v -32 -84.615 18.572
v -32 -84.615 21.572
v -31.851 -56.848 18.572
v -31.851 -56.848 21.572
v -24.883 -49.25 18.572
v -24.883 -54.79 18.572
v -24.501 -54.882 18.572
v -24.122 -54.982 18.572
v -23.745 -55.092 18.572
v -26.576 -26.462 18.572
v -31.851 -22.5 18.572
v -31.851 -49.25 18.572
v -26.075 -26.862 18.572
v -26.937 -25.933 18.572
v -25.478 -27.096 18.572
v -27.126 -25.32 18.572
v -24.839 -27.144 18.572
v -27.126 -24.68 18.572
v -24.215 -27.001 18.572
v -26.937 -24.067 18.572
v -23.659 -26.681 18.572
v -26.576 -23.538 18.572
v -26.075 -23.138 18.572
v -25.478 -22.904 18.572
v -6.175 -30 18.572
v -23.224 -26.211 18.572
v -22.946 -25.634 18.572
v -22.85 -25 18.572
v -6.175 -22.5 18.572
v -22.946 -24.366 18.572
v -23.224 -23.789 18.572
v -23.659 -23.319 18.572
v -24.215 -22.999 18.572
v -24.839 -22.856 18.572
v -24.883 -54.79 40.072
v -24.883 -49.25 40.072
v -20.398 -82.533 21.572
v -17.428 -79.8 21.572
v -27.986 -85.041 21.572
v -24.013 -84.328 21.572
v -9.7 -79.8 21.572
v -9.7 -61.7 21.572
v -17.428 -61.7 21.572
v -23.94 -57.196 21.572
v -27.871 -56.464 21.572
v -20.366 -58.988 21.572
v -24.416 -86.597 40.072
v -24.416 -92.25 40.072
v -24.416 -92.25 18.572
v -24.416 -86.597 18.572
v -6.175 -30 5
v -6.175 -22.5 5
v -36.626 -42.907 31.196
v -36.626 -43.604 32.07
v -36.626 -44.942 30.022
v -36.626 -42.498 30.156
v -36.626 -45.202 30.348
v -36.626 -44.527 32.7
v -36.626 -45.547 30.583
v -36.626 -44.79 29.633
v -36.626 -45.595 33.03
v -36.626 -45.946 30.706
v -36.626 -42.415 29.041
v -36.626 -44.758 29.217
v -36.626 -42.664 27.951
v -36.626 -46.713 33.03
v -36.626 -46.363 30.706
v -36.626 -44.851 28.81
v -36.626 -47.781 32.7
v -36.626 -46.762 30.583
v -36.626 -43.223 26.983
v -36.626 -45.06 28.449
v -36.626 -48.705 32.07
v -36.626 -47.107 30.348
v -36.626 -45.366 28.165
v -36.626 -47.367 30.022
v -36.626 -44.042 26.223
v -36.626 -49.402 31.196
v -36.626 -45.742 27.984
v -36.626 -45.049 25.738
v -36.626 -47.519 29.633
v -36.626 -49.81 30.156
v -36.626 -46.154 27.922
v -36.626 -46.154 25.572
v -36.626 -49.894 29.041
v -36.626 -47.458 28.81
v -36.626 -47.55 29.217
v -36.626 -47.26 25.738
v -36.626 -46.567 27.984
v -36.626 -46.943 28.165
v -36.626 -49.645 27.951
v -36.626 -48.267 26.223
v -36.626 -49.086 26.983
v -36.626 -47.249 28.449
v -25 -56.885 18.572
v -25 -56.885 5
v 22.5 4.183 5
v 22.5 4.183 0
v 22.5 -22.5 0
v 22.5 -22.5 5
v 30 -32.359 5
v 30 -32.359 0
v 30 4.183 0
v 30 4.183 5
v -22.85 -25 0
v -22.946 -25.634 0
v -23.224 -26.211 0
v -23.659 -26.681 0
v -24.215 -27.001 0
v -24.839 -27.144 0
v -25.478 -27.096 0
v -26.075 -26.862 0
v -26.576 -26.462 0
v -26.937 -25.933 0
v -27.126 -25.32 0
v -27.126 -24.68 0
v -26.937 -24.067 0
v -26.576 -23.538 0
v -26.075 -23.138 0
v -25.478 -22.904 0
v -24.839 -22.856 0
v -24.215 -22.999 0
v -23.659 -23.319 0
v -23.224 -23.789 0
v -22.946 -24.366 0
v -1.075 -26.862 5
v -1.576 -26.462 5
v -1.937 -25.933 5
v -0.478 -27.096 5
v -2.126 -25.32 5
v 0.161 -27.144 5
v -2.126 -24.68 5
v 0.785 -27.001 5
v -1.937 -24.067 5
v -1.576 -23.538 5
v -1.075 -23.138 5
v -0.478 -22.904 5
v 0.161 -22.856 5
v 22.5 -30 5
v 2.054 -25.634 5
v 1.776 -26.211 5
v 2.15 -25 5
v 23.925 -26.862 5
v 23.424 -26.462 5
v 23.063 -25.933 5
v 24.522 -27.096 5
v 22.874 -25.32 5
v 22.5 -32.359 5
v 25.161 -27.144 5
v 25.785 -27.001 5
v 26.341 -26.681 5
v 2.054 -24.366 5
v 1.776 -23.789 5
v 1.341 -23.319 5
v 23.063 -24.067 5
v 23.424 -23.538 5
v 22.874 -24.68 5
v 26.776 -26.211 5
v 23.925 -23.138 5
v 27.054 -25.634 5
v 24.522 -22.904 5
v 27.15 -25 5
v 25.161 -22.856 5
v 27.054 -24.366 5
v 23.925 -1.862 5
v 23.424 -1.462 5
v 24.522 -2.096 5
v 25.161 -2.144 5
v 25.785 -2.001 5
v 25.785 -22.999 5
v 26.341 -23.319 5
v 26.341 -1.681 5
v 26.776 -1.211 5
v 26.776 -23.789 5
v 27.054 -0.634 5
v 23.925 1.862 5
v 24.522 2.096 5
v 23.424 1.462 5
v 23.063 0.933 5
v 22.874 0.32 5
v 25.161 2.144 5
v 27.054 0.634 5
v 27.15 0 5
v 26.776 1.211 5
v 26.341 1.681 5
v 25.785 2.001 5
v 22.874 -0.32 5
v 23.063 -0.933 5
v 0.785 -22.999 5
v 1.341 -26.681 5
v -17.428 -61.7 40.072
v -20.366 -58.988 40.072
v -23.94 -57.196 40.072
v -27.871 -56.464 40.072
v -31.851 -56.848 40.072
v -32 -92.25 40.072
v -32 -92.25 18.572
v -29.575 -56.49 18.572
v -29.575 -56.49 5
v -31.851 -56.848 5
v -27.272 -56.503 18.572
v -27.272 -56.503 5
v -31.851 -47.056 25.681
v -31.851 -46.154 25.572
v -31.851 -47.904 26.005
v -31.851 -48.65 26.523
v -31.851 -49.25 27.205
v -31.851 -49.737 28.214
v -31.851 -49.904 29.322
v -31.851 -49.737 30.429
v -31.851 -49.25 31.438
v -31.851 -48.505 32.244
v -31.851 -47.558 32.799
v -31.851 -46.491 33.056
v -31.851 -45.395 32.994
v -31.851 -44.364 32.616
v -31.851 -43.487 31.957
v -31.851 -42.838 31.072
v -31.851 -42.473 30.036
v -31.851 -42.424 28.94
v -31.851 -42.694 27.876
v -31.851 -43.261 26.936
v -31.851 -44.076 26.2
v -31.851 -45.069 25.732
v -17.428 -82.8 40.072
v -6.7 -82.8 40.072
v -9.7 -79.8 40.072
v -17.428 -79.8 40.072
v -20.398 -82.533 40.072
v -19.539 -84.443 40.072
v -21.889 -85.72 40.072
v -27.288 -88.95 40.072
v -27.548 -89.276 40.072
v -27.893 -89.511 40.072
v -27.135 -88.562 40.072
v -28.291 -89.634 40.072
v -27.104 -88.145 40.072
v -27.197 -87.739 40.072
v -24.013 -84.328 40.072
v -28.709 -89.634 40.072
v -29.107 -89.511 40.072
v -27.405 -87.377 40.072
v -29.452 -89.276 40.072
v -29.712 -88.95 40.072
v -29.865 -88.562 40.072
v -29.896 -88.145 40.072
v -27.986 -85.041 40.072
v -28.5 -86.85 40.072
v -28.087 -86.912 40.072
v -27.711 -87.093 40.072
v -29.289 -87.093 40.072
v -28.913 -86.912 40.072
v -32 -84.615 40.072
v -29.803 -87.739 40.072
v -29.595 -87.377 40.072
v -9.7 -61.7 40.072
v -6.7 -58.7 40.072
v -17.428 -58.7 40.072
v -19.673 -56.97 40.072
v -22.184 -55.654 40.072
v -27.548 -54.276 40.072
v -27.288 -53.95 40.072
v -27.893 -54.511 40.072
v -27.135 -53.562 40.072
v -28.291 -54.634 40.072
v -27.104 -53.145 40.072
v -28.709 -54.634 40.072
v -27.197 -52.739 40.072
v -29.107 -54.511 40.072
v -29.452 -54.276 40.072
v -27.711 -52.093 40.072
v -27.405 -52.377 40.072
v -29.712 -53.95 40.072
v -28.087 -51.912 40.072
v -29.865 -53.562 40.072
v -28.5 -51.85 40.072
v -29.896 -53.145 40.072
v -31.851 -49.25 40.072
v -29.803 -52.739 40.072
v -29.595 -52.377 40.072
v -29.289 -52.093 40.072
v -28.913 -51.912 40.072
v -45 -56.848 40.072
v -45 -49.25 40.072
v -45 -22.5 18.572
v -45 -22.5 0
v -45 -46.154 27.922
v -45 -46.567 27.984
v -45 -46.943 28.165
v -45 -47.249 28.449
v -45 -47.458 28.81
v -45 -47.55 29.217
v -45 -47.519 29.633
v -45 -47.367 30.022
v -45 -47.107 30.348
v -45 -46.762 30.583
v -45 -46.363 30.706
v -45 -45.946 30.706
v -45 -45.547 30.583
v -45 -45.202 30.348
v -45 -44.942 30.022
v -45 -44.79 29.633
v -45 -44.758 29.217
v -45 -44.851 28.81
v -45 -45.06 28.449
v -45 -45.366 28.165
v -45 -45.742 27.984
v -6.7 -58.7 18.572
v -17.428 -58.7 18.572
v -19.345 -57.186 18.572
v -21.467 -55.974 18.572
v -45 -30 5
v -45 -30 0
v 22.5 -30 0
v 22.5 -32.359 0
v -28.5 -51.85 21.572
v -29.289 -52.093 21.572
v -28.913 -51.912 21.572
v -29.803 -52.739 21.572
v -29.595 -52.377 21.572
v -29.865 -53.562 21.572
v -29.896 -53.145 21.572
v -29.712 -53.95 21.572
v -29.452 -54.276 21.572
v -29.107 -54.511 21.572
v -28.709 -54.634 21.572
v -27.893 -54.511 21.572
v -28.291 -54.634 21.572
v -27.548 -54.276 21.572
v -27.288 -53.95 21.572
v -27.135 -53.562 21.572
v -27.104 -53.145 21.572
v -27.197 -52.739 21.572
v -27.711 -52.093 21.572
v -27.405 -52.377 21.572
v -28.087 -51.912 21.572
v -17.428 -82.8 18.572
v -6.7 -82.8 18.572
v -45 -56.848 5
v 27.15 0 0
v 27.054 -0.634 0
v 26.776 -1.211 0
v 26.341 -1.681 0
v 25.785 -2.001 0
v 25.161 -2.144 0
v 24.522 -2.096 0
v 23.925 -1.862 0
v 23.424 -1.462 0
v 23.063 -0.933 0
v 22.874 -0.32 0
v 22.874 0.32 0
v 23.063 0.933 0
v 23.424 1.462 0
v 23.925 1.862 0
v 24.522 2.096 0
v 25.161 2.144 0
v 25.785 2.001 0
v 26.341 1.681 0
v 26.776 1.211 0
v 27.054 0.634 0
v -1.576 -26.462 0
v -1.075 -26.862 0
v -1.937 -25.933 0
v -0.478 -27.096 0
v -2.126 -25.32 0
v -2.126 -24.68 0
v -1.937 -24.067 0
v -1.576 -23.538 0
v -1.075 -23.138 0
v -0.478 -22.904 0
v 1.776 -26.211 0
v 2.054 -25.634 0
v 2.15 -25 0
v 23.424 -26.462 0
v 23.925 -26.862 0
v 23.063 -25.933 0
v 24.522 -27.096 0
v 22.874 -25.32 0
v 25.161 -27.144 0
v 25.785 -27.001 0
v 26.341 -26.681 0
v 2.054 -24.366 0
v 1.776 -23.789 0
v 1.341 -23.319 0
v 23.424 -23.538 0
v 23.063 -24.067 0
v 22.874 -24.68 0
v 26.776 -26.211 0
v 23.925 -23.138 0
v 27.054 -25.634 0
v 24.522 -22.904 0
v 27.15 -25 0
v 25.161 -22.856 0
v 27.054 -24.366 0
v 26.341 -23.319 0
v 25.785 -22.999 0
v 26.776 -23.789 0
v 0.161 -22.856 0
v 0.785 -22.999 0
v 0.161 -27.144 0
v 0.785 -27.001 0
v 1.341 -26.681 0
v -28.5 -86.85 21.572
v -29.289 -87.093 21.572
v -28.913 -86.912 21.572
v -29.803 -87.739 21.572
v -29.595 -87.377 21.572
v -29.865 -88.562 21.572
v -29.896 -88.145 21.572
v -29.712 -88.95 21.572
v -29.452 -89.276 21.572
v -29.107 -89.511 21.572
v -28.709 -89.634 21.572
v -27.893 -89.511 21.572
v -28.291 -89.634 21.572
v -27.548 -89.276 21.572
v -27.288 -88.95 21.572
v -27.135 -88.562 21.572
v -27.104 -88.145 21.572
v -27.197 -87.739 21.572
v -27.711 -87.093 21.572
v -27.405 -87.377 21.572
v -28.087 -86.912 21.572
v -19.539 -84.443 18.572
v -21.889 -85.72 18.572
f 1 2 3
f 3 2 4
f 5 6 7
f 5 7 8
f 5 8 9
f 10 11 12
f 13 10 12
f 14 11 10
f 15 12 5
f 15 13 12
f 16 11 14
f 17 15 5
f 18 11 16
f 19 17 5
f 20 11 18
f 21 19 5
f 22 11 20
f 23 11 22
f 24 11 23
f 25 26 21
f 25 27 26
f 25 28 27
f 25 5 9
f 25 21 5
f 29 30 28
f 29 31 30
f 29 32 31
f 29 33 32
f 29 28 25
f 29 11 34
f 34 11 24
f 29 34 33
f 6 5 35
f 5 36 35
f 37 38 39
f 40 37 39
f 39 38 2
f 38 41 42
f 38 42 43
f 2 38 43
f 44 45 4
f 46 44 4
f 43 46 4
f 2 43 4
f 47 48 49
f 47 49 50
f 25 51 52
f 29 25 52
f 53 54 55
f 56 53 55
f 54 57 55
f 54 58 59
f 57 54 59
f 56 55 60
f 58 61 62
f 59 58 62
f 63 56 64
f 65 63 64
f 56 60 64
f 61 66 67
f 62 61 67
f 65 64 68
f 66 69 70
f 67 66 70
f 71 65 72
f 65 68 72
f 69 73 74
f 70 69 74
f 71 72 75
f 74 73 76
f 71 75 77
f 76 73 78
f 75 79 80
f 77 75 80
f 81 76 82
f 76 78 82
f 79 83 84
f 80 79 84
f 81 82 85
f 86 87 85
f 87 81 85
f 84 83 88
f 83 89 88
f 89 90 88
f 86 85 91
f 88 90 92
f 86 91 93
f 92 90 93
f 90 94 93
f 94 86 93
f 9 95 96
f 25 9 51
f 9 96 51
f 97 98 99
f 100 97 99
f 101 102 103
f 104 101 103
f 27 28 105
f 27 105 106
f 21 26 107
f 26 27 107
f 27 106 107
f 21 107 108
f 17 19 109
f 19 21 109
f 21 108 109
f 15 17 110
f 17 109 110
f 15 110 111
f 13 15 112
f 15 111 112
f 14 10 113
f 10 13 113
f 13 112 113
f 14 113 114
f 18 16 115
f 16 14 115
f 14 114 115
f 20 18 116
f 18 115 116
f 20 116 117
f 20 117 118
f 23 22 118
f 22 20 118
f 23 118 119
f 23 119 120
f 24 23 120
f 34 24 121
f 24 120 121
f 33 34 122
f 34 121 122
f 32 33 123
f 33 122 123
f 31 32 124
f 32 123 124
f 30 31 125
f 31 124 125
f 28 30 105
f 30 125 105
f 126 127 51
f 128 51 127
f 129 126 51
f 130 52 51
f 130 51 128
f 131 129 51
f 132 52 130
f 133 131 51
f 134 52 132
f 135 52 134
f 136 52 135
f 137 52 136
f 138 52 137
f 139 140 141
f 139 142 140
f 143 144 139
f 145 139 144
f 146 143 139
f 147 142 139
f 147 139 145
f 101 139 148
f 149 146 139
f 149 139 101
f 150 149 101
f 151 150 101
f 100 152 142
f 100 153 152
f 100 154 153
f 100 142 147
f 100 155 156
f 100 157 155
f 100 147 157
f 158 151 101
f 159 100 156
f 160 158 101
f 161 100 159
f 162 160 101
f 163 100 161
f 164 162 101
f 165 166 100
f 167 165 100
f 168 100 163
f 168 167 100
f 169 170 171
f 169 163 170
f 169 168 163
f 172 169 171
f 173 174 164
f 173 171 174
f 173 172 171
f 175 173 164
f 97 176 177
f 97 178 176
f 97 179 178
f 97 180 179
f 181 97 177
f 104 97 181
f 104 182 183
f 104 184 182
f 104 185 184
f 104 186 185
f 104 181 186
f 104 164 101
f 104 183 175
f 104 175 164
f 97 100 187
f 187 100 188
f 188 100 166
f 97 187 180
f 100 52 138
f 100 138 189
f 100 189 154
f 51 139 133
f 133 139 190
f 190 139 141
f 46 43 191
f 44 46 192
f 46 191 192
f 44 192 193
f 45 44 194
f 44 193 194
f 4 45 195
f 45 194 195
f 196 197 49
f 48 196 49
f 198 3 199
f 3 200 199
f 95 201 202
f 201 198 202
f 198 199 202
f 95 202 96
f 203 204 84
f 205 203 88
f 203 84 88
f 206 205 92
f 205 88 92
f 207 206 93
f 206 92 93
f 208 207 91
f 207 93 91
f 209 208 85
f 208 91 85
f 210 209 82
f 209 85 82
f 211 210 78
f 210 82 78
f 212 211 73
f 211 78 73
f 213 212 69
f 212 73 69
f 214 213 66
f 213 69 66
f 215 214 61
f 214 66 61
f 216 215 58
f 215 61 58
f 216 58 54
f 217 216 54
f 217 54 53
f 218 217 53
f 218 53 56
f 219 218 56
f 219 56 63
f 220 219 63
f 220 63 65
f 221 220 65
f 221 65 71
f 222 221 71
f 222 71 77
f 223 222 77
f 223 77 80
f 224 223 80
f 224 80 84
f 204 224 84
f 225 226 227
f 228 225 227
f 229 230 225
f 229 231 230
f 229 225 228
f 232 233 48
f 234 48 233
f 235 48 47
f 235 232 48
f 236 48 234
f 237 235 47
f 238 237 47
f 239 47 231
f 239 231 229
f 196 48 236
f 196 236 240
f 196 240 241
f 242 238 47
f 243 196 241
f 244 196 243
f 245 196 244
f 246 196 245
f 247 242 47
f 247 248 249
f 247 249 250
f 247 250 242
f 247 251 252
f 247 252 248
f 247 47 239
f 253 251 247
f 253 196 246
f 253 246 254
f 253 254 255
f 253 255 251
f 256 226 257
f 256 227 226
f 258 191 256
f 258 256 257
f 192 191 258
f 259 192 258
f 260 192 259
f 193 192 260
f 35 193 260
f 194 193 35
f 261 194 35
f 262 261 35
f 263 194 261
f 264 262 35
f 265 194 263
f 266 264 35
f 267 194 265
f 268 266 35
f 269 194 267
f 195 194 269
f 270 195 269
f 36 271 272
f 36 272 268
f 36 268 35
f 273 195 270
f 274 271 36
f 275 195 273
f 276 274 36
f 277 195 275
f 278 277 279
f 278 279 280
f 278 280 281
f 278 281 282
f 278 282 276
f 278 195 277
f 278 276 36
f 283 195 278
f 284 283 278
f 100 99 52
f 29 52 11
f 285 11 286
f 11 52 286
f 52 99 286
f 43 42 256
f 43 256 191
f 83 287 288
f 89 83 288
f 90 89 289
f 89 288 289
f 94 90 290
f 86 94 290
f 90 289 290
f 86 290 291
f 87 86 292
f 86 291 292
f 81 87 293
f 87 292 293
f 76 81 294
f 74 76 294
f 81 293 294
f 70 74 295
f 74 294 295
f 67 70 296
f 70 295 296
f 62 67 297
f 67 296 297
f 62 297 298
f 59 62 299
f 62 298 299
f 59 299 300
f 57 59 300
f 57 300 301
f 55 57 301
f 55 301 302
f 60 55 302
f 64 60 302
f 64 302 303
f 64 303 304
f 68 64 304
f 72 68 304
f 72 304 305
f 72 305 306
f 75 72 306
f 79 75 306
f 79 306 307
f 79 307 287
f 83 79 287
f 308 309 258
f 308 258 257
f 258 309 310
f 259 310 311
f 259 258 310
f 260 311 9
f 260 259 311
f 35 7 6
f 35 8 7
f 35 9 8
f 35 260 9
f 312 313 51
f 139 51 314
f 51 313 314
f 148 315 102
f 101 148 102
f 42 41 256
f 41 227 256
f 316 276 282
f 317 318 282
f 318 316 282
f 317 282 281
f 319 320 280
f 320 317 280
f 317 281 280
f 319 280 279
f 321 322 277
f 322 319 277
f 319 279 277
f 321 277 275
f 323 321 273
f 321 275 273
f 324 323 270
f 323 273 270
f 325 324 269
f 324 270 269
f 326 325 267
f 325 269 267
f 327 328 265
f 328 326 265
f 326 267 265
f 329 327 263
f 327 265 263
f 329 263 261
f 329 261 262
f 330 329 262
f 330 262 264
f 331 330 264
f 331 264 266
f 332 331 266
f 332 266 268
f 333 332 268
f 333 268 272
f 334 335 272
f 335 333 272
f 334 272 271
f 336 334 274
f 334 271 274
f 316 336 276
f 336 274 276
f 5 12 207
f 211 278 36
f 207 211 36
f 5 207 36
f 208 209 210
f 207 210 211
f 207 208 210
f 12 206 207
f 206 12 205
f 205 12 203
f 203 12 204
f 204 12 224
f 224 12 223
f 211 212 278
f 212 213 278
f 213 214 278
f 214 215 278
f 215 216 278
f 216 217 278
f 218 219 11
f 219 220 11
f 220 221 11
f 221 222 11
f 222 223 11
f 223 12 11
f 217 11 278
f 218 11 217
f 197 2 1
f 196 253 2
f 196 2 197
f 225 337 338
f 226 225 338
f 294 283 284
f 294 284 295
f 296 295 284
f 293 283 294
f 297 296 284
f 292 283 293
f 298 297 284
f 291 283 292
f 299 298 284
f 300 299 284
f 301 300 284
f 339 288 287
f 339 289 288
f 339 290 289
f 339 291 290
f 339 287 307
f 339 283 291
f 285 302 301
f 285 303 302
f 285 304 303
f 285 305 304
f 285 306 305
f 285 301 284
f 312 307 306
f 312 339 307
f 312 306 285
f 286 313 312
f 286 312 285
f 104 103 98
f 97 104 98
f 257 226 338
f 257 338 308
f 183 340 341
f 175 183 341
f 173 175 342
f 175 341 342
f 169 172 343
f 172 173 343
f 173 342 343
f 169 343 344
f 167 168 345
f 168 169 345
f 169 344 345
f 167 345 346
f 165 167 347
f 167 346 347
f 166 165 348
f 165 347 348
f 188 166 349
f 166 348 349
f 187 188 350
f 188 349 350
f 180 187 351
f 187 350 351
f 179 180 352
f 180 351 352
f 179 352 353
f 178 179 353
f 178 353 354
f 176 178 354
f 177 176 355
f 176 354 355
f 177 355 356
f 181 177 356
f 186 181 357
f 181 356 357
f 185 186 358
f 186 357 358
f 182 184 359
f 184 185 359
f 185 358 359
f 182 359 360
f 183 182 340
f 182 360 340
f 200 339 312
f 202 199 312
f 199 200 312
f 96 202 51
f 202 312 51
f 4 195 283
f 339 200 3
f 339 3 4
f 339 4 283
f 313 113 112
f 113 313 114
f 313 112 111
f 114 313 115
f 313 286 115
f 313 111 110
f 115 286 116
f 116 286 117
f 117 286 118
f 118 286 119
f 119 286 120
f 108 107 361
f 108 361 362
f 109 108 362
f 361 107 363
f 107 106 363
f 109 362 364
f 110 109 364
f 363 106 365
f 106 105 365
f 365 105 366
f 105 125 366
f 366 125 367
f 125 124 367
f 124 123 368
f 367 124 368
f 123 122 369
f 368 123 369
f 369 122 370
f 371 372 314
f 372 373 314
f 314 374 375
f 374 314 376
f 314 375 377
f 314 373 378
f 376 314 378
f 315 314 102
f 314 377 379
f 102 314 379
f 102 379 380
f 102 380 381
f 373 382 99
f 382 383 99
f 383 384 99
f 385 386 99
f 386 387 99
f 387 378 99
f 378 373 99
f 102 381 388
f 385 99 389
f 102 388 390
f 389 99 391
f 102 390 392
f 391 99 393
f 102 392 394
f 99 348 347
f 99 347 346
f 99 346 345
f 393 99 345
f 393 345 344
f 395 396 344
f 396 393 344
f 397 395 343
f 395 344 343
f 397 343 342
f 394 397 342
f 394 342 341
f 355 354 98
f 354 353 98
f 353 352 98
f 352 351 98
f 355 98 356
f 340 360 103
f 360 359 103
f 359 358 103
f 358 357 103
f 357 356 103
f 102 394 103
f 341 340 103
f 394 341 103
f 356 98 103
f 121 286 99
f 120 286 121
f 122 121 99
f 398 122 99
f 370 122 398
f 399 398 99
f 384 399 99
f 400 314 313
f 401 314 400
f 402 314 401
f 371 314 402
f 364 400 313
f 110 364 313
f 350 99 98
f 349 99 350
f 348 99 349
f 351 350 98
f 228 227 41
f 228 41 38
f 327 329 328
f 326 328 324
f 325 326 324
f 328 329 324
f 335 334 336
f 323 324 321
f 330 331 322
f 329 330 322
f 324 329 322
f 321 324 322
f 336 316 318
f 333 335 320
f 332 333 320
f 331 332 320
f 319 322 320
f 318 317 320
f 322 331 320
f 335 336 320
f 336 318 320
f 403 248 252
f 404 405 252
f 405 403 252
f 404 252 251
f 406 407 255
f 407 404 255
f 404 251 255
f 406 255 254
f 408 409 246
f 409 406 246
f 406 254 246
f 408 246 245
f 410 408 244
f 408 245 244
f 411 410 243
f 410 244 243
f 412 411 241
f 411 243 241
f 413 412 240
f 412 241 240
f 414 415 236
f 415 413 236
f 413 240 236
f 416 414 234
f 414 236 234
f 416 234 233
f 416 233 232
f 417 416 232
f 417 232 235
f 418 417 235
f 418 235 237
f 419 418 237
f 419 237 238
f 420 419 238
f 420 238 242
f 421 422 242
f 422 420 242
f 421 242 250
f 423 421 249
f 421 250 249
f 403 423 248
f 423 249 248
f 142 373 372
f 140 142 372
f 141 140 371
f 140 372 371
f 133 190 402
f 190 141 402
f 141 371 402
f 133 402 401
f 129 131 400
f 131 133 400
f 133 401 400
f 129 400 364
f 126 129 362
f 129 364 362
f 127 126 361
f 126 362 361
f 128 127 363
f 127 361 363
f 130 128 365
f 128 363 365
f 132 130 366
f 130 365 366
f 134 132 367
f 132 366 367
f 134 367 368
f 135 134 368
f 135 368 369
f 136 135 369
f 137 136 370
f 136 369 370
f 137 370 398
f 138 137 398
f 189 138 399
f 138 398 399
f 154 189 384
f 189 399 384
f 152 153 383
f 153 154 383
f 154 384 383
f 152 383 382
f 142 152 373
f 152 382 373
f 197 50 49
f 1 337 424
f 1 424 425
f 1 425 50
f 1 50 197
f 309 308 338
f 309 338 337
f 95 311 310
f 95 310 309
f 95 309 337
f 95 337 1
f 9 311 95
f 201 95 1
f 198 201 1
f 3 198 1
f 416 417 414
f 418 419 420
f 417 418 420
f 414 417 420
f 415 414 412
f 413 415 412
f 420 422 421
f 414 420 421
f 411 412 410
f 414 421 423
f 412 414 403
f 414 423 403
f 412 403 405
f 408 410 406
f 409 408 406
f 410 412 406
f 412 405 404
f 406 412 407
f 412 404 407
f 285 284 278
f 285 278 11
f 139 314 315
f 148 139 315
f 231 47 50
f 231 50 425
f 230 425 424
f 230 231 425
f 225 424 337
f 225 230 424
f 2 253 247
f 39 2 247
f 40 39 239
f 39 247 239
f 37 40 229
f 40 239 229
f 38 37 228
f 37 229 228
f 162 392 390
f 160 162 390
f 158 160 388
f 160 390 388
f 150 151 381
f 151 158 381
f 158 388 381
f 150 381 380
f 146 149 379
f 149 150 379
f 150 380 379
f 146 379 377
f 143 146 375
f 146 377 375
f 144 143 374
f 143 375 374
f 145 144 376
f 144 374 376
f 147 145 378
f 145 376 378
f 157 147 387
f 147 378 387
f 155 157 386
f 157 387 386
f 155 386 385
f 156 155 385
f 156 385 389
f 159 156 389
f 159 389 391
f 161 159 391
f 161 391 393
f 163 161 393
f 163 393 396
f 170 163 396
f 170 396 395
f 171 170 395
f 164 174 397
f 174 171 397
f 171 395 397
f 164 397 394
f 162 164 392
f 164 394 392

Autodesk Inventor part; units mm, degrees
ref_plane "YZ Plane" through (0, 0, 0) normal (1, 0, 0) x (0, 1, 0)
ref_plane "XZ Plane" through (0, 0, 0) normal (0, 1, 0) x (-1, 0, 0)
ref_plane "Work Plane1" through (0, 0, 0) normal (0, 0, 1) x (1, 0, 0)
sketch "Sketch1" plane through (0, 0, 0) normal (0, 0, 1) x (1, 0, 0)
  line L0 (-45, 22) -> (22, 22) projected
  line L1 (22, 22) -> (22, -22) projected
  line L2 (22, -22) -> (-45, -22) projected
  line L3 (-45, -28) -> (-45, -22) projected
  line L4 (-30, -28) -> (-45, -28) projected
  line L5 (-30, -28) -> (-28, -30) projected
  line L6 (-28, -30) -> (28, -30) projected
  line L7 (28, -30) -> (30, -28) projected
  line L8 (30, -28) -> (30, 28) projected
  line L9 (30, 28) -> (28, 30) projected
  line L10 (28, 30) -> (-28, 30) projected
  line L11 (-28, 30) -> (-30, 28) projected
  line L12 (-30, 28) -> (-45, 28) projected
  line L13 (-45, 22) -> (-45, 28) projected
  circle A0 centre (25, 25) radius 1.95 projected
  circle A1 centre (25, 0) radius 1.95 projected
  circle A2 centre (0, 25) radius 1.95 projected
  circle A3 centre (-25, -25) radius 1.95 projected
  circle A4 centre (25, -25) radius 1.95 projected
  circle A5 centre (-25, 25) radius 1.95 projected
  circle A6 centre (0, -25) radius 1.95 projected
  line L14 (30, 4.1832) -> (22.5, 4.1832)
  line L15 (22.5, 4.1832) -> (22.5, -32.3594)
  line L16 (22.5, -32.3594) -> (30, -32.3594)
  line L17 (30, -32.3594) -> (30, 4.1832)
  line L18 (22.5, -22.5) -> (-45, -22.5)
  line L19 (-45, -22.5) -> (-45, -30)
  line L20 (-45, -30) -> (22.5, -30)
  line L21 (22.5, -30) -> (22.5, -22.5)
  circle A7 centre (25, 0) radius 2.15
  circle A8 centre (25, -25) radius 2.15
  circle A9 centre (0, -25) radius 2.15
  circle A10 centre (-25, -25) radius 2.15
  point P0 (0, 0)
  dimension "d0" = 0
  dimension "d1" = 0.5
  dimension "d2" = 0.5
  dimension "d3" = 0.2
  dimension "d4" = 0.2
  dimension "d5" = 0.2
  dimension "d6" = 0.2
extrude "Extrusion1" add sketch "Sketch1" along normal blind 5 contours L18 L15 L6 L5 L4 L3 | L4 L5 L20 L19 | L15 L14 L8 L7 L6 | L6 L7 L17 L16 L15
ref_plane "Work Plane2" through (-32, -78.0277, 40.0715) normal (0, 0, -1) x (0, 1, 0)
sketch "Sketch2" plane through (-32, -78.0277, 40.0715) normal (0, 0, -1) x (0, 1, 0)
  arc A0 (-8.1223, 3.5) -> (-12.3223, 3.5) centre (-10.2223, 3.5) ccw projected
  arc A1 (-1.4723, 14.4287) -> (-6.2777, 7) centre (7.2777, 3.5) ccw projected
  arc A2 (20.8332, 7) -> (16.0277, 14.4287) centre (7.2777, 3.5) ccw projected
  arc A3 (22.6777, 3.5) -> (26.8777, 3.5) centre (24.7777, 3.5) ccw projected
  line L0 (-6.2777, 0) -> (-10.2223, 0) projected
  arc A4 (-6.7223, 3.5) -> (21.2777, 3.5) centre (7.2777, 3.5) ccw projected
  line L1 (-6.5873, 0) -> (-14.2223, 0)
  line L2 (-14.2223, 0) -> (-14.2223, 7.5835)
  line L3 (-14.2223, 7.5835) -> (-8.5689, 7.5835)
  line L4 (21.1796, 0.1492) -> (27.0132, 0.1492)
  line L5 (27.0132, 0.1492) -> (28.7777, 0.1492)
  line L6 (28.7777, 0.1492) -> (28.7777, 7.1168)
  line L7 (28.7777, 7.1168) -> (23.2373, 7.1168)
  circle A5 centre (24.7777, 3.5) radius 1.4
  circle A6 centre (-10.2223, 3.5) radius 1.4
  line L8 (-1.7723, 14.5719) -> (-4.7723, 14.5719)
  line L9 (-4.7723, 14.5719) -> (-4.7723, 25.3)
  line L10 (-4.7723, 25.3) -> (-1.7723, 25.3)
  line L11 (-1.7723, 25.3) -> (-1.7723, 14.5719)
  line L12 (16.3277, 14.5719) -> (19.3277, 14.5719)
  line L13 (19.3277, 14.5719) -> (19.3277, 25.3)
  line L14 (19.3277, 25.3) -> (16.3277, 25.3)
  line L15 (16.3277, 25.3) -> (16.3277, 14.5719)
  line L16 (16.3277, 25.3) -> (-1.7723, 25.3)
  line L17 (-1.7723, 25.3) -> (-1.7723, 22.3)
  line L18 (-1.7723, 22.3) -> (16.3277, 22.3)
  line L19 (16.3277, 22.3) -> (16.3277, 25.3)
  arc A7 (21.1796, 0.1492) -> (16.3277, 14.5719) centre (7.2777, 3.5) ccw
  arc A8 (-1.7723, 14.5719) -> (-6.5873, 0) centre (7.2777, 3.5) ccw
  arc A9 (23.2373, 7.1168) -> (19.3277, 14.5719) centre (7.2777, 3.5) ccw
  arc A10 (-4.7723, 14.5719) -> (-8.5689, 7.5835) centre (7.2777, 3.5) ccw
  line L20 (-1.4723, 22) -> (16.0277, 22)
  point P0 (78.0277, 32)
  dimension "d14" = 2.8
  dimension "d15" = 2.8
  dimension "d16" = 4
  dimension "d17" = 4
  dimension "d33" = 3
  dimension "d36" = 3
  dimension "d37" = 3
  dimension "d40" = 0.3
  dimension "d41" = 0.3
  dimension "d42" = 0.3
  dimension "d43" = 0.3
  dimension "d44" = 0.3
ref_plane "Work Plane3" through (-42.5, -74.75, 21.5715) normal (0, 0, -1) x (0, 1, 0)
extrude "Extrusion2" add sketch "Sketch2" along normal up to surface (18.5 mm away)
sketch "Sketch3" plane through (-24.8832, -49.25, 21.5715) normal (0, 0, -1) x (-1, 0, 0)
  arc A0 (6.9676, -7.5981) -> (-7.4551, -12.45) centre (3.6168, -21.5) ccw projected
  line L0 (6.9676, 0) -> (6.9676, -7.5981) projected
  line L1 (0, 0) -> (6.9676, 0) projected
  line L2 (0, -5.5404) -> (0, 0) projected
  arc A1 (0, -5.5404) -> (-7.4551, -9.45) centre (3.6168, -21.5) ccw projected
  circle A2 centre (3.6168, -4) radius 1.4 projected
  arc A3 (6.9676, -7.5981) -> (-7.4551, -12.45) centre (3.6168, -21.5) ccw projected
  line L3 (-18.1832, -9.45) -> (-7.4551, -9.45) projected
  line L4 (-15.1832, -12.45) -> (-15.1832, -30.55) projected
  line L5 (-7.4551, -12.45) -> (-15.1832, -12.45) projected
  line L6 (-18.1832, -33.55) -> (-18.1832, -9.45) projected
  line L7 (-7.4551, -33.55) -> (-18.1832, -33.55) projected
  arc A4 (-7.4551, -33.55) -> (-0.4667, -37.3466) centre (3.6168, -21.5) ccw projected
  line L8 (-0.4667, -43) -> (-0.4667, -37.3466) projected
  line L9 (7.1168, -43) -> (-0.4667, -43) projected
  line L10 (7.1168, -35.3651) -> (7.1168, -43) projected
  arc A5 (-7.4551, -30.55) -> (7.1168, -35.3651) centre (3.6168, -21.5) ccw projected
  line L11 (-15.1832, -30.55) -> (-7.4551, -30.55) projected
  line L12 (7.1168, -35.3651) -> (6.9676, -7.5981)
  point P0 (-24.8832, 49.25)
  point P1 (7.3934, -35.5712)
extrude "Extrusion3" add sketch "Sketch3" along normal blind 3 contours L12 A5 L11 L4 L5 A0 | A0 L5 L4 L11 A5 L10 L9 L8 A4 L7 L6 L3 A1 L2 L1 L0 | A2
sketch "Sketch4" plane through (0, 0, 5) normal (0, 0, 1) x (1, 0, 0)
  circle A0 centre (25, 0) radius 2.15 projected
  circle A1 centre (25, -25) radius 2.15 projected
  circle A2 centre (-25, -25) radius 2.15 projected
  circle A3 centre (0, -25) radius 2.15 projected
  line L0 (22.5, -22.5) -> (-45, -22.5) projected
  line L1 (-45, -22.5) -> (-45, -30) projected
  line L2 (-45, -30) -> (22.5, -30) projected
  line L3 (22.5, -30) -> (22.5, -32.3594) projected
  line L4 (22.5, -32.3594) -> (30, -32.3594) projected
  line L5 (30, -32.3594) -> (30, 4.1832) projected
  line L6 (30, 4.1832) -> (22.5, 4.1832) projected
  line L7 (22.5, 4.1832) -> (22.5, -22.5) projected
  arc A4 (-25, -57.1946) -> (-32, -57.1946) centre (-28.5, -70.75) ccw projected
  line L8 (-45, -22.5) -> (-45, -30) projected
  arc A5 (-17.4281, -61.7) -> (-31.8508, -56.8481) centre (-28.5, -70.75) ccw projected
  line L9 (-45, -22.5) -> (-31.8508, -22.5)
  line L10 (-31.8508, -22.5) -> (-31.8508, -56.8481)
  line L11 (-31.8508, -56.8481) -> (-45, -56.8481)
  line L12 (-45, -56.8481) -> (-45, -22.5)
  line L13 (-25, -56.8849) -> (-6.175, -30)
  line L14 (-45, -30) -> (22.5, -30) projected
  line L15 (-25, -56.8849) -> (7.8204, -56.8849) construction
  line L16 (-6.175, -30) -> (-6.175, -22.5)
  line L17 (22.5, -22.5) -> (-45, -22.5) projected
  line L18 (-25, -53.25) -> (-25, -57.1946) projected
  line L19 (-31.8508, -22.5) -> (-6.175, -22.5)
  line L20 (-6.175, -22.5) -> (-6.175, -30)
  line L21 (-6.175, -30) -> (-31.8508, -30)
  line L22 (-31.8508, -30) -> (-31.8508, -22.5)
  point P0 (0, 0)
  point P1 (-32, -84.6151)
  dimension "d20" = 55
extrude "Extrusion4" add sketch "Sketch4" along normal up to surface (13.5715 mm away) contours L16 L2 L10 L0 | L10 L2 L1 L0 | L13 A5 L10 L2 | L10 L11 L12 L2
sketch "Sketch5" plane through (-45, -30, 0) normal (-1, 0, 0) x (0, 0, 1)
  line L0 (40.0715, -26.8481) -> (40.0715, -19.25) projected
  line L1 (40.0715, -19.25) -> (18.5715, -19.25) projected
  line L2 (18.5715, -26.8481) -> (18.5715, 7.5) projected
  line L3 (40.0715, -26.8481) -> (40.0715, -19.25) projected
  line L4 (0, 7.5) -> (18.5715, 7.5) projected
  line L5 (40.0715, -19.25) -> (18.5715, 7.5)
  line L6 (40.0715, -26.8481) -> (21.5715, -26.8481) projected
  line L7 (21.5715, -26.8481) -> (18.5715, -26.8481) projected
  line L8 (18.5715, -26.8481) -> (18.5715, -19.25) projected
  line L9 (40.0715, -19.25) -> (18.5715, -19.25)
  line L10 (18.5715, -19.25) -> (18.5715, 7.5)
  line L11 (18.5715, 7.5) -> (40.0715, -19.25)
  line L12 (40.0715, -19.25) -> (18.5715, -19.25)
  line L13 (18.5715, -19.25) -> (18.5715, -26.8481)
  line L14 (18.5715, -26.8481) -> (40.0715, -26.8481)
  line L15 (40.0715, -26.8481) -> (40.0715, -19.25)
  point P0 (0, 30)
  point P1 (5, 7.5)
extrude "Extrusion5" add sketch "Sketch5" against normal up to surface (13.1492 mm away)
sketch "Sketch6" plane through (-31.8508, -49.25, 18.5715) normal (1, 0, 0) x (0, 0, -1)
  line L0 (-21.5, 0) -> (0, 0) projected
  line L1 (0, 26.75) -> (0, 0) projected
  circle A0 centre (-10.75, 3.0956) radius 1.4
  line L2 (0, 26.75) -> (-21.5, 0) projected
  point P0 (18.5715, 49.25)
  dimension "d25" = 2.8
hole "Hole1" at (-31.8508, -46.1544, 29.3215) direction (-1, 0, 0) diameter 2.8 depth 20 tip angle 118 counterbore diameter 7.5 counterbore depth 4.775
properties part number "cellSTORM_v5_focusmotormount"
